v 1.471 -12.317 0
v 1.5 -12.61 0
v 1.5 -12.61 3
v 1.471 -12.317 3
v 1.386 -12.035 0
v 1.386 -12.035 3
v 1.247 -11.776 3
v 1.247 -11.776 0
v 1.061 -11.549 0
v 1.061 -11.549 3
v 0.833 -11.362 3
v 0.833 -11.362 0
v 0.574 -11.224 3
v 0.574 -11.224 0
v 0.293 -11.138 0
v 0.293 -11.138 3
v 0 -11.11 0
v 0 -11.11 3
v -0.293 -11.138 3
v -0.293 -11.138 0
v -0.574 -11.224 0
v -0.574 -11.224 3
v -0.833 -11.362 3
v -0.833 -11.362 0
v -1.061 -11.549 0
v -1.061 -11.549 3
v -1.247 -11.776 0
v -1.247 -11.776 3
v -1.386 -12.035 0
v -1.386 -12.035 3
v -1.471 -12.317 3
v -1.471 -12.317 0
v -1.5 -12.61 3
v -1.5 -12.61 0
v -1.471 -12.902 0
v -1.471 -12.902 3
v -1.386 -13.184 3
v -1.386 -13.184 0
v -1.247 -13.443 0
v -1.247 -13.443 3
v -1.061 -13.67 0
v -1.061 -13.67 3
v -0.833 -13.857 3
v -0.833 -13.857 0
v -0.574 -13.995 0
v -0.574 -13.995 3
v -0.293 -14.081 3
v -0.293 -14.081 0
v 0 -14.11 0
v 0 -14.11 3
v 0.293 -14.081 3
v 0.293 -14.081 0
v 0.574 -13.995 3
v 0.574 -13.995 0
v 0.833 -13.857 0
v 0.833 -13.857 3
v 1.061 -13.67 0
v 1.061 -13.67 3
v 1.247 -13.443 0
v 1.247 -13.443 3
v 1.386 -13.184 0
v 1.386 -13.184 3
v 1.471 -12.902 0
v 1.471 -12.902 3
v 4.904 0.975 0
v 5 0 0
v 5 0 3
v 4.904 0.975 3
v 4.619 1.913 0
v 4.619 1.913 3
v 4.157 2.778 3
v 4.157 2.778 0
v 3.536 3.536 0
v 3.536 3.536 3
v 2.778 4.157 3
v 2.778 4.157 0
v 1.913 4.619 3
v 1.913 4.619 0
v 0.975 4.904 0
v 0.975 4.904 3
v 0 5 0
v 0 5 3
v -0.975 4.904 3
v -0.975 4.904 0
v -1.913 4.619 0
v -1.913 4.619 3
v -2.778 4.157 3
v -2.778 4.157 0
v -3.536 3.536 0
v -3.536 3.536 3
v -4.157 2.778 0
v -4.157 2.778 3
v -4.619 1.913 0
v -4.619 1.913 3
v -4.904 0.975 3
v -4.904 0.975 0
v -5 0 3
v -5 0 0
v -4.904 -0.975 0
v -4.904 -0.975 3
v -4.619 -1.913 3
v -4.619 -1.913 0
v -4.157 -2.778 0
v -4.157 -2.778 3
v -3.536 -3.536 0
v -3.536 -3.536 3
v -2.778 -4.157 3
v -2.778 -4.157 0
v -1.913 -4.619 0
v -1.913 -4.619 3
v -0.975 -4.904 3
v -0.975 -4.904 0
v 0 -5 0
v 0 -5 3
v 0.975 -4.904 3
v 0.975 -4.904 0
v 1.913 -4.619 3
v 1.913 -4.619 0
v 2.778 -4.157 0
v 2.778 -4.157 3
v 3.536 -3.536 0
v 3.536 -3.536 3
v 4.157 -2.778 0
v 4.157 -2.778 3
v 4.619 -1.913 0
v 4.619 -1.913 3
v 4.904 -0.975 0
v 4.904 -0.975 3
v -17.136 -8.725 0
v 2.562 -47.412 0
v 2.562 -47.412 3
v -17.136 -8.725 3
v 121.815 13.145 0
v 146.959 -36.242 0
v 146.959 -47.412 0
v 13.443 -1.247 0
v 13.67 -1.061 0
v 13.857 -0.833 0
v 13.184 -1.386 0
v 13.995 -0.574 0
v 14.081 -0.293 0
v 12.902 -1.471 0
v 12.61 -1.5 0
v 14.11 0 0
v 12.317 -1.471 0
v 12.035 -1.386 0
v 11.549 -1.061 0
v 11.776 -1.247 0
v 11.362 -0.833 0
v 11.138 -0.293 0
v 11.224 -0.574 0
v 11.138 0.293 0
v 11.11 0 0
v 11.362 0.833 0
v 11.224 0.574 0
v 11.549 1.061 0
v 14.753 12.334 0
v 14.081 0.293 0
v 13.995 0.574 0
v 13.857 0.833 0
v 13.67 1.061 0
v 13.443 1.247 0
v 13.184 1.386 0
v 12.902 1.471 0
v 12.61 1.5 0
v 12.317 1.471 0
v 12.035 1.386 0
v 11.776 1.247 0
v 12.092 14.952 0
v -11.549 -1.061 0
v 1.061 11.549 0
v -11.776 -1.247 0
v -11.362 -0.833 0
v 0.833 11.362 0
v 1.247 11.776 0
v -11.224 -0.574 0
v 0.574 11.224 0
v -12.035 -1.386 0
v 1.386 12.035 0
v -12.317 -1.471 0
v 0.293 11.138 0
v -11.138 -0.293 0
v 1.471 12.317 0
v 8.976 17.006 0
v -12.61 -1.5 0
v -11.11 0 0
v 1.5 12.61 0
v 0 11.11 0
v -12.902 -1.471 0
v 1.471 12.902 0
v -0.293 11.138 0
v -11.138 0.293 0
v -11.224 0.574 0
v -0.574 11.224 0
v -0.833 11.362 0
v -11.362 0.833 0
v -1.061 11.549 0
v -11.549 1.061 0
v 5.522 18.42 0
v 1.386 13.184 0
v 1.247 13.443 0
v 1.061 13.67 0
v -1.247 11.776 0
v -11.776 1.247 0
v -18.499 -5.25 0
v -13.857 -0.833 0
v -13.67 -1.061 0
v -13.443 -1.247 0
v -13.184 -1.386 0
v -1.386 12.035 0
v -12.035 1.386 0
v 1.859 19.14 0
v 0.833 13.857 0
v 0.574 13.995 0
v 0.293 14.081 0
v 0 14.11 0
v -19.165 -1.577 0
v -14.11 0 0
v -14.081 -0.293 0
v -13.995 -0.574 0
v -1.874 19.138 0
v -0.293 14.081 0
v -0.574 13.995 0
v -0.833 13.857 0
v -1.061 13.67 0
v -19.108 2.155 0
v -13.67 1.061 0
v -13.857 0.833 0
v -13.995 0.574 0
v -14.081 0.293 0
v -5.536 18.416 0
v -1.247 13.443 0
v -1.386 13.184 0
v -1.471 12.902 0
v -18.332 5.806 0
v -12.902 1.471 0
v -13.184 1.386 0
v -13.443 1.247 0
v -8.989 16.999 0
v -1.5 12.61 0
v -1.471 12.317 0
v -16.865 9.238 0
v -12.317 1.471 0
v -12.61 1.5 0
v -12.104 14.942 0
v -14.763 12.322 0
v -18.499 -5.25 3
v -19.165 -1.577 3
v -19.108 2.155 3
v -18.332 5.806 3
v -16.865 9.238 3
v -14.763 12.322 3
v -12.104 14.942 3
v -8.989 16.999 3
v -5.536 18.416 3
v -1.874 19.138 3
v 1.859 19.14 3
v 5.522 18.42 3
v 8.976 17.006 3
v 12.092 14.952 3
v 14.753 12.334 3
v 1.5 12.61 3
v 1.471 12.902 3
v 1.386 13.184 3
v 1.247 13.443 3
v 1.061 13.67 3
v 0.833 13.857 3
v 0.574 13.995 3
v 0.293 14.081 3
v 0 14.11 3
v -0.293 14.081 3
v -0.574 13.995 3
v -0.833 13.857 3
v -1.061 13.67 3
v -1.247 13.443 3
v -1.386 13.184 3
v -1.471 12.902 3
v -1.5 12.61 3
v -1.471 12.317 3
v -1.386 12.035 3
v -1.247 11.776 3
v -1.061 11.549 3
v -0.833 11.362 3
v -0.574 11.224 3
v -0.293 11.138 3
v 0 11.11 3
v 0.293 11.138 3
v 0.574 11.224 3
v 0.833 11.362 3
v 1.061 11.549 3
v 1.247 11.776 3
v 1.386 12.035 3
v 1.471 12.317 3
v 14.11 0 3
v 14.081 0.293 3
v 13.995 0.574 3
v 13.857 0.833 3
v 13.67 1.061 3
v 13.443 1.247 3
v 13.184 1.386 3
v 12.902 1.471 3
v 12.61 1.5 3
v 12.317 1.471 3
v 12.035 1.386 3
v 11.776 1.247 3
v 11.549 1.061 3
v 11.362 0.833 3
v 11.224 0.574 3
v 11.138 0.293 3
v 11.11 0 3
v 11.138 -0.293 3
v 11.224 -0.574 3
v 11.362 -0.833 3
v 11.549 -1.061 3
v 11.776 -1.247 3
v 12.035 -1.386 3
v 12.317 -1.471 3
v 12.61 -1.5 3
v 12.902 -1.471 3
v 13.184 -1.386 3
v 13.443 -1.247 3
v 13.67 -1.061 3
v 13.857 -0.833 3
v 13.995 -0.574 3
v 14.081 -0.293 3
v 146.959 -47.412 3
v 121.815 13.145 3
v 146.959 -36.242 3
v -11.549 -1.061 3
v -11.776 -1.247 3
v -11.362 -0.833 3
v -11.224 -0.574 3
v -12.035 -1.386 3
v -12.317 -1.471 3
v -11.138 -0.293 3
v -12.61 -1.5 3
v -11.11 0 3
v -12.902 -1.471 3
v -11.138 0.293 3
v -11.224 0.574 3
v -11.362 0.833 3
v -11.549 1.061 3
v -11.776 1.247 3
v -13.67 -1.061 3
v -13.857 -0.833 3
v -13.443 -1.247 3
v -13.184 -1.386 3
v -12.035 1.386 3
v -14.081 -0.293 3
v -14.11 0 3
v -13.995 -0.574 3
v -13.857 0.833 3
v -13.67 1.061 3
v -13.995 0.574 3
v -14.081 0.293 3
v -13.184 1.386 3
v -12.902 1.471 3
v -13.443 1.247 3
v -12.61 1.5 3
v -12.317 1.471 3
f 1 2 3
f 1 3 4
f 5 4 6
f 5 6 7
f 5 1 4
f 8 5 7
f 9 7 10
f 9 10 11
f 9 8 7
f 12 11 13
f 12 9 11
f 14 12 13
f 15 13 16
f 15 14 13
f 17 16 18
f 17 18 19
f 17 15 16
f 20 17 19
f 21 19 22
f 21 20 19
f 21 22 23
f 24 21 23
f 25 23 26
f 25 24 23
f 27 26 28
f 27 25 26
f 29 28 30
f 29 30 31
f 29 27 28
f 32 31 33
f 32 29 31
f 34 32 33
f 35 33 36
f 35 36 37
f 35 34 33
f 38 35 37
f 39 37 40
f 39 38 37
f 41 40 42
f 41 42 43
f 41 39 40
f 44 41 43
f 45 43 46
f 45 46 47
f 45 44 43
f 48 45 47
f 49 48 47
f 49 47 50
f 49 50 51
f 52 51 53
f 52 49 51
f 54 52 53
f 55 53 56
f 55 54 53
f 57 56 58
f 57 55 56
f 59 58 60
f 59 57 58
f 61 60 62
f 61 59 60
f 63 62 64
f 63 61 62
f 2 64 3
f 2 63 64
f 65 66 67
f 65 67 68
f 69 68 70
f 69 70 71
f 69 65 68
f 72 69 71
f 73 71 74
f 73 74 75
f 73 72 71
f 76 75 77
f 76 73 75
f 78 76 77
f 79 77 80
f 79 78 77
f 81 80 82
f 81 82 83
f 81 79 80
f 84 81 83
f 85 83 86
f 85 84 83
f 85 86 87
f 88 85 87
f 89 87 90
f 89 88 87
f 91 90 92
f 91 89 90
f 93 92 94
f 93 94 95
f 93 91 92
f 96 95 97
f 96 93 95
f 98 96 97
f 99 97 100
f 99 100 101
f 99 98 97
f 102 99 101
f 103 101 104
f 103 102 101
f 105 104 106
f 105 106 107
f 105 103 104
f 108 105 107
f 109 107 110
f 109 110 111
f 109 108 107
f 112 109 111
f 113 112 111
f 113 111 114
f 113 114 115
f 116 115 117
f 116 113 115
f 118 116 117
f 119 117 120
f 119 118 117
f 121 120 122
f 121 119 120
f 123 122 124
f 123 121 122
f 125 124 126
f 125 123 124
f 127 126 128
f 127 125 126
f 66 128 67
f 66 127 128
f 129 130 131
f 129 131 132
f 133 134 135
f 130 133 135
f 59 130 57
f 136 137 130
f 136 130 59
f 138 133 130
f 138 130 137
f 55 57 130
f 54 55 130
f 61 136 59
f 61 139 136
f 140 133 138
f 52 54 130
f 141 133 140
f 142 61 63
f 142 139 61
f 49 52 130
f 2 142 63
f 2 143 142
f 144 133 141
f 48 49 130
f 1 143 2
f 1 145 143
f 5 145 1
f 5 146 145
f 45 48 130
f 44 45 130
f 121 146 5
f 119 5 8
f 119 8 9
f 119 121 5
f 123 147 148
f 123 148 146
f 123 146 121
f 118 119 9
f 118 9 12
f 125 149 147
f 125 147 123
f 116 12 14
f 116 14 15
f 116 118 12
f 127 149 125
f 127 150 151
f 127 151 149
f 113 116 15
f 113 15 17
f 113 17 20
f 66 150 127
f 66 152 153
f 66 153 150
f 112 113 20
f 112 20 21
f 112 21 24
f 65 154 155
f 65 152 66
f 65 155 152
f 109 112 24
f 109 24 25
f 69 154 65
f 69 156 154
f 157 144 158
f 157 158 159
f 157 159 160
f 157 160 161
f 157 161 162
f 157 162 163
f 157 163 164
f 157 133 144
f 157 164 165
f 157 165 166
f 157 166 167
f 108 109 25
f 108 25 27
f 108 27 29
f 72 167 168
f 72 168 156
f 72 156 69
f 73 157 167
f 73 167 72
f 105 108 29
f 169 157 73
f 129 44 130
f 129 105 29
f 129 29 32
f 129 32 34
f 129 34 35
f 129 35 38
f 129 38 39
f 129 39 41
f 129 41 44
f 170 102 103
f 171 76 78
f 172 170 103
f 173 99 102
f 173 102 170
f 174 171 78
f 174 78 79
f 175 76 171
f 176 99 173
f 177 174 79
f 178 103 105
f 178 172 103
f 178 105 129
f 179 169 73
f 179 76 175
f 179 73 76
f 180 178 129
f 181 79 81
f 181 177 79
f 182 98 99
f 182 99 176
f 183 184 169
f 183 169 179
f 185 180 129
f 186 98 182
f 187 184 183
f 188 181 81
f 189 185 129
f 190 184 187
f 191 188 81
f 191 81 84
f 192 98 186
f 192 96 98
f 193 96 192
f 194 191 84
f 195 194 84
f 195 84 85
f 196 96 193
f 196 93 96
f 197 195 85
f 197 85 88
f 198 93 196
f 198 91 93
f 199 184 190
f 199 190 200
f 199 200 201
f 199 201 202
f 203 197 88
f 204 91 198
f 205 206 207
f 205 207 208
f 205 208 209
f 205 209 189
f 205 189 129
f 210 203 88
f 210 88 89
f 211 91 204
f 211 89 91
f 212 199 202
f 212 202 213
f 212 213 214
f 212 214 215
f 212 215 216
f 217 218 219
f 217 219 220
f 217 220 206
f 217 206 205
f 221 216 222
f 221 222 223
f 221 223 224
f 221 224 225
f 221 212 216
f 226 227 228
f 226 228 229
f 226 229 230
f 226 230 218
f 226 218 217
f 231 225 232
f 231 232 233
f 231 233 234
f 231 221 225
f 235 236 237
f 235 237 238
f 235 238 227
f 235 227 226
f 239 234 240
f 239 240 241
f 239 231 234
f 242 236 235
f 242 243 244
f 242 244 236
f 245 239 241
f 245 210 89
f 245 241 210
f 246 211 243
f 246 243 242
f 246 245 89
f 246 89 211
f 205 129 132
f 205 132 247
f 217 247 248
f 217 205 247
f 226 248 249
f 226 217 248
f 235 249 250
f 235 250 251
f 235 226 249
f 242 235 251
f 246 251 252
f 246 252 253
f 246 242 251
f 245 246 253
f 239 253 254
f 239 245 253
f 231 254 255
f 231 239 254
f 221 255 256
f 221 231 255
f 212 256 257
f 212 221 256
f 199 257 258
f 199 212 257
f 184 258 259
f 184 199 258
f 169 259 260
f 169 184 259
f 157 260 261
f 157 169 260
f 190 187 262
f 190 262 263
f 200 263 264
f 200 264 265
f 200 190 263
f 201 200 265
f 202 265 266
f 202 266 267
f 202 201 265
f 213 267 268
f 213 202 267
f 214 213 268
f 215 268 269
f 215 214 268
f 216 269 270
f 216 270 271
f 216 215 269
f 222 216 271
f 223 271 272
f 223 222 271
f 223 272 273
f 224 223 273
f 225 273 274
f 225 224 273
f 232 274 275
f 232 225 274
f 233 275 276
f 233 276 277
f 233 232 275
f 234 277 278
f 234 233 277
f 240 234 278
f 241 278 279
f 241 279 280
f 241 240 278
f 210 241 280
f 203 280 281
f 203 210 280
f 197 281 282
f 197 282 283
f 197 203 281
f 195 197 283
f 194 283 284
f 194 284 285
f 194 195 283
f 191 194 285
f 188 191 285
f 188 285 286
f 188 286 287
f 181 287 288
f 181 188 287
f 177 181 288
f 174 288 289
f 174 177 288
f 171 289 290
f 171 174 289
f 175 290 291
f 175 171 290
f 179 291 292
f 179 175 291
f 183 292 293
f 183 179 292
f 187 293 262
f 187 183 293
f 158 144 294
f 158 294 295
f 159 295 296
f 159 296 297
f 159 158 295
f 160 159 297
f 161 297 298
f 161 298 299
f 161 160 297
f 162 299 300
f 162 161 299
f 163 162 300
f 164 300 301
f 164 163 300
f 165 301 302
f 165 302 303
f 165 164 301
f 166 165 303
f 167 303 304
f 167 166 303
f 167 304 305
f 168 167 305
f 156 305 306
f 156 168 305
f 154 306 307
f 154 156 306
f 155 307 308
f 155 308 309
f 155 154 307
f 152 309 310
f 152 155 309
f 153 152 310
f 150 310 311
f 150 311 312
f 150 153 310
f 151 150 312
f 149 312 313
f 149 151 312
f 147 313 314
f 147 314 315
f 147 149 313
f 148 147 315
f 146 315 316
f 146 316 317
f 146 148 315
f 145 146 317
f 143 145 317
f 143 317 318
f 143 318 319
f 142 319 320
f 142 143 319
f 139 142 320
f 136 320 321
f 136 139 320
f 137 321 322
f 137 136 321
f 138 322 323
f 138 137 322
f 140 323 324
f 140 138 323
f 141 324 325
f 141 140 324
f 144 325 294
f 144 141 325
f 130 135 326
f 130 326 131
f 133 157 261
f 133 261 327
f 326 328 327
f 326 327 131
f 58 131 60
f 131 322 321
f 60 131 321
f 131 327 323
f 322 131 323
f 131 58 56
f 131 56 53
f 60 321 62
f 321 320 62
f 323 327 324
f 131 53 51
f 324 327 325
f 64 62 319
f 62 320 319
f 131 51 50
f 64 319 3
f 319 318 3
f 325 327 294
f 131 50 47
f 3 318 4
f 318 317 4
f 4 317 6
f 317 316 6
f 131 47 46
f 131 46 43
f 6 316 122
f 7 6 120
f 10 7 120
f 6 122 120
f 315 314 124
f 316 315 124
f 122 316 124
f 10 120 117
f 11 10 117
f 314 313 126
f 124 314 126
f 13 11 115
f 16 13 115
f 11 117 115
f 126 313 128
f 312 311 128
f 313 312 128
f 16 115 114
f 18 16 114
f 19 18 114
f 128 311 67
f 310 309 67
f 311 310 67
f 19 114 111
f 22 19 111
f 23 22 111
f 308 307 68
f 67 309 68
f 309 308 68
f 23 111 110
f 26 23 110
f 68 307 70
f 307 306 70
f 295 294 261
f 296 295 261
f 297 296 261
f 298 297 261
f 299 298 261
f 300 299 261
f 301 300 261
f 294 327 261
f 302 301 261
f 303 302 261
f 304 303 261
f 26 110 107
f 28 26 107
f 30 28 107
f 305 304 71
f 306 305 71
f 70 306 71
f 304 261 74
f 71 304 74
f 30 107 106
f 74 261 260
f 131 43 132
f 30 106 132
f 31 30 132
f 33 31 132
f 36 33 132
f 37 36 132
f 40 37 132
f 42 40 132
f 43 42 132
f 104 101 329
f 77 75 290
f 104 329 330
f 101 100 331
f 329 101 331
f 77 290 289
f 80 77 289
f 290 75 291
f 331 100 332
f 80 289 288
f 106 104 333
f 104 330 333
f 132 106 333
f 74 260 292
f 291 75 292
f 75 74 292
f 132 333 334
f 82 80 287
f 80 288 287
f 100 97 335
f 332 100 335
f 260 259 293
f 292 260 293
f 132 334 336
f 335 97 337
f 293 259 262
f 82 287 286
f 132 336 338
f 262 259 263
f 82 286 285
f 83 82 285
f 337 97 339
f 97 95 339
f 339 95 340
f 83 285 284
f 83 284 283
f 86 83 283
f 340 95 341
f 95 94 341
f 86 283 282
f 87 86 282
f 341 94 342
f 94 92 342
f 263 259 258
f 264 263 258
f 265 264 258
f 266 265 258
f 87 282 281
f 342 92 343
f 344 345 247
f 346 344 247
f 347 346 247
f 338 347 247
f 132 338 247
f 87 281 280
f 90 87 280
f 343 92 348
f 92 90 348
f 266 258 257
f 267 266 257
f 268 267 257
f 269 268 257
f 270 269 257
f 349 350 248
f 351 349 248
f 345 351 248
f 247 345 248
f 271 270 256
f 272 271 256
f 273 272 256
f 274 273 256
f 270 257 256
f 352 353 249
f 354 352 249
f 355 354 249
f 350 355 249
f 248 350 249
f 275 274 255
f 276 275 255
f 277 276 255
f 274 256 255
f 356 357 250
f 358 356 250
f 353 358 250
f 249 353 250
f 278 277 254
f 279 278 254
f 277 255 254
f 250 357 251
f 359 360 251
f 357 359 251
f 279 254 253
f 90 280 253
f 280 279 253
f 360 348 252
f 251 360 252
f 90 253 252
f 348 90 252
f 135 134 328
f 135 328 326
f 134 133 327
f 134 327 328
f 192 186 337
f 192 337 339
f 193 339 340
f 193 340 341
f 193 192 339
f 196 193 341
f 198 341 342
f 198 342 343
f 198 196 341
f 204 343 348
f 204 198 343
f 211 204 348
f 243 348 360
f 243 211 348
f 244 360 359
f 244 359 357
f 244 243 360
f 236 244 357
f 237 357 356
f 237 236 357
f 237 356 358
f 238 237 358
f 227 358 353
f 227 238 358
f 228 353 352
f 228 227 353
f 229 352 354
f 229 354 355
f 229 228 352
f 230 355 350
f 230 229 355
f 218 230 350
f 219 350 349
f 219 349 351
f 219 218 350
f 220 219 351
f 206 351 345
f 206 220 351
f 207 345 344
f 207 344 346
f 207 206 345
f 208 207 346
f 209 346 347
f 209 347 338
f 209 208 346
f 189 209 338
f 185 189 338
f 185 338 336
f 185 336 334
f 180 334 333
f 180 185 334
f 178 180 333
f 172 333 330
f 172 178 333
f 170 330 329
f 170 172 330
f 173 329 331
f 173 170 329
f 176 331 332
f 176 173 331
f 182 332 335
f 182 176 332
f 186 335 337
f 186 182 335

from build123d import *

# Parameters (mm, degrees)
SKETCH1_R           = 5
SKETCH1_R_2         = 1.5
BOSS_EXTRUDE1_DEPTH = 3


with BuildPart() as part:
    # Sketch1 → Boss-Extrude1 (new body)
    with BuildSketch(Plane.XY):
        with BuildLine():
            Line((121.815327096, 13.144873556), (146.959411549, -36.24203935))
            Line((146.959411549, -36.24203935), (146.959411549, -47.411715326))
            Line((146.959411549, -47.411715326), (2.561732102, -47.411715326))
            Line((2.561732102, -47.411715326), (-17.136179556, -8.72517889))
            ThreePointArc((-17.136179556, -8.72517889), (-10.596670935, 16.046431426), (14.753160039, 12.333761198))
            Line((14.753160039, 12.333761198), (121.815327096, 13.144873556))
        make_face()
        Circle(SKETCH1_R, mode=Mode.SUBTRACT)
        with Locations((12.609500958, 0)):
            Circle(SKETCH1_R_2, mode=Mode.SUBTRACT)
        with Locations((0, -12.609500958)):
            Circle(SKETCH1_R_2, mode=Mode.SUBTRACT)
        with Locations((-12.609500958, 0)):
            Circle(SKETCH1_R_2, mode=Mode.SUBTRACT)
        with Locations((0, 12.609500958)):
            Circle(SKETCH1_R_2, mode=Mode.SUBTRACT)
    extrude(amount=BOSS_EXTRUDE1_DEPTH)


solid = part.part
